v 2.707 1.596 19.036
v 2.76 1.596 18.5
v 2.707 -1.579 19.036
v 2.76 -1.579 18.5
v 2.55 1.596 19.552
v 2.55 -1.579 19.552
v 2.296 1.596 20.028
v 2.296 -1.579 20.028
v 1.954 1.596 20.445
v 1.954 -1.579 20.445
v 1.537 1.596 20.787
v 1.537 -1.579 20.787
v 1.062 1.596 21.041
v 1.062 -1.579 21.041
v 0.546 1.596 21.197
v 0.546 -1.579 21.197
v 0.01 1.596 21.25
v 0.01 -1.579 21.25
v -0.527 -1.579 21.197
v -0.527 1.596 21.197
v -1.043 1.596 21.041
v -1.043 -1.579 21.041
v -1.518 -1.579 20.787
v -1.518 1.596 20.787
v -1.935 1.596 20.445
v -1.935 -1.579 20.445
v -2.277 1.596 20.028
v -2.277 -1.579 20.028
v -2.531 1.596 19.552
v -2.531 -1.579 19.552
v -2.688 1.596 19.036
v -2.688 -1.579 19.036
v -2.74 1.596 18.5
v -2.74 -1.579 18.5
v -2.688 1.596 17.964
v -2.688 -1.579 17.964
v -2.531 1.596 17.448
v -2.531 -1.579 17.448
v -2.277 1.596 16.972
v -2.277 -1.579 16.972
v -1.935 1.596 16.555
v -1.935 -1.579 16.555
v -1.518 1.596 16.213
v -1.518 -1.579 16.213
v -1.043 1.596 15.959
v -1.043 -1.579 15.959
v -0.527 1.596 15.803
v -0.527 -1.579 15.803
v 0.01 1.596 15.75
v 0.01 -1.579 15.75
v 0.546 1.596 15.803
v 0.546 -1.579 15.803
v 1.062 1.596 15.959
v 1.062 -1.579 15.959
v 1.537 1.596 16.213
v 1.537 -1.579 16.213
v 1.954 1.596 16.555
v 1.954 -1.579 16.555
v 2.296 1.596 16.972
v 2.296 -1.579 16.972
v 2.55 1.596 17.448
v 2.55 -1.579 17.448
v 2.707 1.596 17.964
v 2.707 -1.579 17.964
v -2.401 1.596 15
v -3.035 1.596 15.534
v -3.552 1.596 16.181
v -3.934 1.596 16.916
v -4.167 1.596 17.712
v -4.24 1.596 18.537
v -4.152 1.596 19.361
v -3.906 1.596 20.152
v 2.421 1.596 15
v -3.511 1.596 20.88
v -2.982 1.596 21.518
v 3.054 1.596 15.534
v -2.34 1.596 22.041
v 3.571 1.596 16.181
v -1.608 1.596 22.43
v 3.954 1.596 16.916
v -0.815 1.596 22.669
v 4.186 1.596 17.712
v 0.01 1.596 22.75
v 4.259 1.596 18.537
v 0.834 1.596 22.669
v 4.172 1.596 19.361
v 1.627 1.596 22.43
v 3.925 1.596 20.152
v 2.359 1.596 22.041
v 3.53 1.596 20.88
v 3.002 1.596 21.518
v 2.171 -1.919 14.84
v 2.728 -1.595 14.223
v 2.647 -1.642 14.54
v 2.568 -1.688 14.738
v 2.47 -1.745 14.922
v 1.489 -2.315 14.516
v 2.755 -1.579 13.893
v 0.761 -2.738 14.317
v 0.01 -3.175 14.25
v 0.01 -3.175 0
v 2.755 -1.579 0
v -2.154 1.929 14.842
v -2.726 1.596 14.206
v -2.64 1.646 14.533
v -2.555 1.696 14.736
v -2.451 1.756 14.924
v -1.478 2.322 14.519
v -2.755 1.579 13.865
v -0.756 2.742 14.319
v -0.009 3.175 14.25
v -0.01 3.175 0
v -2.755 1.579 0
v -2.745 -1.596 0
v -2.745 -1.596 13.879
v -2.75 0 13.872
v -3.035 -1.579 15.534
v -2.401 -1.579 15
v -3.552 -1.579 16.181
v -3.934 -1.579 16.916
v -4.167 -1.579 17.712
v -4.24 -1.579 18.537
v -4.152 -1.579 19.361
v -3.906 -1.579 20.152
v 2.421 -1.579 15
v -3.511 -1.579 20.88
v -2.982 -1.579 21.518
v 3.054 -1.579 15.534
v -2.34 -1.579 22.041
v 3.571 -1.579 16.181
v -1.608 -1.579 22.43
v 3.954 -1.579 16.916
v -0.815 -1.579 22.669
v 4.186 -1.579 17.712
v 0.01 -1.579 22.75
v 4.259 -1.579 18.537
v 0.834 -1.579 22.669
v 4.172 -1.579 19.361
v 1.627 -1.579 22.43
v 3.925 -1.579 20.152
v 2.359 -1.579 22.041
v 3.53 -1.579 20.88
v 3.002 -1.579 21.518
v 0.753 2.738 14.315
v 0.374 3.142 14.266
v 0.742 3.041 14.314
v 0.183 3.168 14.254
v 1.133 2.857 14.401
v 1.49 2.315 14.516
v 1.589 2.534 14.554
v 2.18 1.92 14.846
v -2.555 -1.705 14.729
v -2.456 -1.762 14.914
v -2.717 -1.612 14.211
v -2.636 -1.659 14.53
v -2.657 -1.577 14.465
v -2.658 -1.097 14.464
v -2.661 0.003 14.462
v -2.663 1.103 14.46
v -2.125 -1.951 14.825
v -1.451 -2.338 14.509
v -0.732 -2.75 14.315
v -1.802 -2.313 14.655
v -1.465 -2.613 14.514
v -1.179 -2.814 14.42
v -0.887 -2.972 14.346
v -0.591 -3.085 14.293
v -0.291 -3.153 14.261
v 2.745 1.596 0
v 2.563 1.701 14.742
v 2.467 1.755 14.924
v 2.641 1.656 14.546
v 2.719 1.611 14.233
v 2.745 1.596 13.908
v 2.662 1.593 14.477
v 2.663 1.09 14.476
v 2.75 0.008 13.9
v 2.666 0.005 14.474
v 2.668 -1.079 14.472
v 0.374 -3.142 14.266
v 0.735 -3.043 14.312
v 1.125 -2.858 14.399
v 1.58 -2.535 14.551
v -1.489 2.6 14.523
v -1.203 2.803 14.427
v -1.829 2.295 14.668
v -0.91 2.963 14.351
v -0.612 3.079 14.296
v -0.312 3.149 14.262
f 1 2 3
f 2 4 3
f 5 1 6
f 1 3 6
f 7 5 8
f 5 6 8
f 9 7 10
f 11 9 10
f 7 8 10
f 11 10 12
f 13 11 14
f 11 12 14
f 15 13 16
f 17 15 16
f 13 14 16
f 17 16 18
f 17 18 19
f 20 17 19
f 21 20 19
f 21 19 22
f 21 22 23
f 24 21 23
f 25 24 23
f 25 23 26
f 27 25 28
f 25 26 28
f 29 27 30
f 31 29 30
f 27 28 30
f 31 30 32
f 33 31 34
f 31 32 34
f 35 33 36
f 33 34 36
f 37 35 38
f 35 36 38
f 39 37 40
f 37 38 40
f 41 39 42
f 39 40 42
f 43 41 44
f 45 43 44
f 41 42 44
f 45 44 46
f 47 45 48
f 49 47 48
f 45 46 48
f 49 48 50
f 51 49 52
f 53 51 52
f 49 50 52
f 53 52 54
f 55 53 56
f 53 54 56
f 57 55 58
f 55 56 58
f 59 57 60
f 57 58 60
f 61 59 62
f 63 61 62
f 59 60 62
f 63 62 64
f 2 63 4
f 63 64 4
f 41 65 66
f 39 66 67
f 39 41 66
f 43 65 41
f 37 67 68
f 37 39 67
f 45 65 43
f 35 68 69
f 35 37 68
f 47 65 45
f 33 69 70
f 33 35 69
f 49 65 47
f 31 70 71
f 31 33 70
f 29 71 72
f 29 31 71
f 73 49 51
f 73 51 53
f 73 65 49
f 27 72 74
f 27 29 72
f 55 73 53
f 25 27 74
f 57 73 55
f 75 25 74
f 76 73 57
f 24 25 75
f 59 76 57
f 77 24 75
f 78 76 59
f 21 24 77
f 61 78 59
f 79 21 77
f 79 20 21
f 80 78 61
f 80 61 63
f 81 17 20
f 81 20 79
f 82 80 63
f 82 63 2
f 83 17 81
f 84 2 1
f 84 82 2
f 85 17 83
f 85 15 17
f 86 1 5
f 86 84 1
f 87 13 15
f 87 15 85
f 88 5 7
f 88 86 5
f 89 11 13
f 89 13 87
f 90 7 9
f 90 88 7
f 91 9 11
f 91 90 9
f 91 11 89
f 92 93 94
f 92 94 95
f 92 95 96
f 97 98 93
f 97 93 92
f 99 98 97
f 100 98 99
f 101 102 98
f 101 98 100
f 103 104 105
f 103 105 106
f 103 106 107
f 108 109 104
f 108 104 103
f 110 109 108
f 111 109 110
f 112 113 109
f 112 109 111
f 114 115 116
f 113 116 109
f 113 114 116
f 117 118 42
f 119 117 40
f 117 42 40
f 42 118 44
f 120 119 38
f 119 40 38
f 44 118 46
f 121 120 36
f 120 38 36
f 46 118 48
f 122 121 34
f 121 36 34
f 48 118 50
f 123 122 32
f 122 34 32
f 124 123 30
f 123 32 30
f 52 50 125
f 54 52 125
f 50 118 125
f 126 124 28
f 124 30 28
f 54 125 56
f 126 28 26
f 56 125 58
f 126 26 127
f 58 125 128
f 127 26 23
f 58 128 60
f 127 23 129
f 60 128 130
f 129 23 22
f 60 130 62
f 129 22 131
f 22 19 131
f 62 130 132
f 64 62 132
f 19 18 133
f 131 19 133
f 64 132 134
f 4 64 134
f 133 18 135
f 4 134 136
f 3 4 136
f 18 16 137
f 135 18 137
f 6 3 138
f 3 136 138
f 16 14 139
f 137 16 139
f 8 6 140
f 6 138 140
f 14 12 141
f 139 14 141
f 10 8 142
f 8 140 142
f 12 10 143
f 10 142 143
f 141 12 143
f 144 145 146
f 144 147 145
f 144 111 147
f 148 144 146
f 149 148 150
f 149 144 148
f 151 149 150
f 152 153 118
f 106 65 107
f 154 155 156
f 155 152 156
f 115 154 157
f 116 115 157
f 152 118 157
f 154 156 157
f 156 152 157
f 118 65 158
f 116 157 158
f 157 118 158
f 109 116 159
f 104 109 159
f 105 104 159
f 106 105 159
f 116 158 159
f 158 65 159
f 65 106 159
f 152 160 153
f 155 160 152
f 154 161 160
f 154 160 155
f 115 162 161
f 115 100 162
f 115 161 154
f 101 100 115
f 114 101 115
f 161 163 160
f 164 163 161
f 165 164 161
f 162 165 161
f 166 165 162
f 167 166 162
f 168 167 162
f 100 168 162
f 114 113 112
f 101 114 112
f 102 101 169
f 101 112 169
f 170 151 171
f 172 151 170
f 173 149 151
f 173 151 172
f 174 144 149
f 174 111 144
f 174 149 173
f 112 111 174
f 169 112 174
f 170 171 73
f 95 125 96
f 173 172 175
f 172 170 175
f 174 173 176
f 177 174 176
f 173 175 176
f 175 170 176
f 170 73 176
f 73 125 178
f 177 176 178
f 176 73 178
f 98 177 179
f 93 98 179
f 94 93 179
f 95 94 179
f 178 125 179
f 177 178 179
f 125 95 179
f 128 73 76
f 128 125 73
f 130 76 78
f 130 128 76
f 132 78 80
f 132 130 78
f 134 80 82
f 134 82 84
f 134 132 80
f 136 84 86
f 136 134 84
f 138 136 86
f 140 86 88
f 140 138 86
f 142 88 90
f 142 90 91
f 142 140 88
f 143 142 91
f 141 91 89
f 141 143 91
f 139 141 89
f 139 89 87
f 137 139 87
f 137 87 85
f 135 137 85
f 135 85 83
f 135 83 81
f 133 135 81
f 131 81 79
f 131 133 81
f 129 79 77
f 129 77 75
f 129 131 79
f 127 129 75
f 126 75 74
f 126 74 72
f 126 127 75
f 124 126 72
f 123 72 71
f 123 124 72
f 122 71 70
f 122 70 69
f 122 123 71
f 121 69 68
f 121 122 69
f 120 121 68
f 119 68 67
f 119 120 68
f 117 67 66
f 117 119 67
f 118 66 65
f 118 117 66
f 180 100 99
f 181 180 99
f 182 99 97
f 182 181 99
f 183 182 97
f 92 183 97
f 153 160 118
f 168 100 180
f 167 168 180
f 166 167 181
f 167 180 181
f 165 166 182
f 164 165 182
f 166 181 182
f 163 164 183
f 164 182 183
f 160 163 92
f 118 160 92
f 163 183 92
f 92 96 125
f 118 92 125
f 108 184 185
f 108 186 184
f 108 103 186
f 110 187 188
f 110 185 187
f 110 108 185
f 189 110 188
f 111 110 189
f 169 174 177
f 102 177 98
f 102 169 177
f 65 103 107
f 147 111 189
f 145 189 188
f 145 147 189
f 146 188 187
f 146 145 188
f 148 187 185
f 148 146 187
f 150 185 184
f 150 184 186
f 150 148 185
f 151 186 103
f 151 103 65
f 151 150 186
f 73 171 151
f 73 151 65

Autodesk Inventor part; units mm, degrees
sketch "Boceto1" plane through (0, 0, 0) normal (0, 0, 1) x (1, 0, 0)
  line L0 (2.7452, 1.596) -> (2.7548, -1.5794)
  line L1 (2.7548, -1.5794) -> (0.0096, -3.1754)
  line L2 (0.0096, -3.1754) -> (-2.7452, -1.596)
  line L3 (-2.7452, -1.596) -> (-2.7548, 1.5794)
  line L4 (-2.7548, 1.5794) -> (-0.0096, 3.1754)
  line L5 (-0.0096, 3.1754) -> (2.7452, 1.596)
  point P0 (0, 0)
  point P1 (0, 0)
  dimension "d0" = 5.5
  dimension "d20" = 6.3508
extrude "Extrusión1" add sketch "Boceto1" along normal blind 15
ref_plane "Plano de trabajo4" through (-2.7452, -1.596, 0) normal (0, 0, -1) x (-1, 0, 0)
sketch "Boceto2" plane through (-2.7452, -1.596, 0) normal (0, 0, -1) x (-1, 0, 0)
  line L0 (-2.7548, -1.5794) -> (1.0358, -1.5794)
  line L1 (1.0358, -1.5794) -> (-2.7548, -1.5794)
  line L2 (-5.6299, -1.5794) -> (-2.7548, -1.5794)
  point P0 (-2.7452, 1.596)
  dimension "d5" = 3.1754
ref_plane "Plano de trabajo5" through (0, -3.175, 0) normal (0, 1, 0) x (-1, 0, 0)
sketch "Boceto3" plane through (0, -3.175, 0) normal (0, 1, 0) x (-1, 0, 0)
  line L0 (-0.0096, 15) -> (-2.7548, 15) projected
  line L1 (2.6199, 14) -> (-2.7548, 14) construction
  line L2 (-0.0096, 0) -> (-0.0096, 15) projected
  line L3 (-0.0096, 14) -> (-0.0096, 18.5)
  circle A0 centre (-0.0096, 18.5) radius 4.25
  circle A1 centre (-0.0096, 18.5) radius 2.75
  point P0 (0, 0)
  dimension "d7" = 1
  dimension "d8" = 4.5
  dimension "d9" = 8.5
  dimension "d14" = 5.5
sketch "Boceto4" plane through (-2.7452, -1.596, 0) normal (0, 0, -1) x (-1, 0, 0)
  point P0 (-2.7452, 1.596)
  point P1 (-2.7356, 4.7714)
  point P2 (-2.7548, -1.579)
  dimension "d10" = 6.3504
extrude "Extrusión2" add sketch "Boceto3" along normal blind 6.35 contours L2 A0 L0 | L0 A0 L2 | A1
ref_plane "Barreno" through (0, 0, 0) normal (0, -1, 0) x (1, 0, 0)
sketch "Boceto6" plane through (0, 0, 0) normal (0, -1, 0) x (1, 0, 0)
  arc A0 (0.0103, 14.25) -> (0.0089, 14.25) centre (0.0096, 18.5) ccw projected
  circle A1 centre (0.0096, 18.5) radius 2.75 projected
  point P0 (0, 0)
  dimension "d13" = 4.25
extrude "Extrusión3" cut sketch "Boceto6" along normal mid plane 10 contours A1
ref_plane "Plano de trabajo8" through (5, 0, 0) normal (1, 0, 0) x (0, 1, 0)
sketch "Boceto8" plane through (5, 0, 0) normal (1, 0, 0) x (0, 1, 0)
  line L0 (-3.175, 15.75) -> (-3.175, 21.25) projected
  line L1 (-3.1754, 14.25) -> (-1.5794, 15)
  line L2 (-1.5794, 15) -> (-1.5794, 22.75)
  line L3 (-1.5794, 22.75) -> (-3.175, 22.75)
  line L4 (3.175, 14.25) -> (1.596, 15)
  line L5 (1.596, 15) -> (1.596, 22.75)
  line L6 (1.596, 22.75) -> (3.175, 22.75)
  ellipse E0 centre (3.1866, 18.5) end of major axis (3.1866, 14.25) minor radius 2.4709 (1.7849, 15) -> (3.175, 14.25) ccw projected
  line L7 (-3.175, 22.75) -> (-6.1952, 22.75)
  line L8 (-6.1952, 22.75) -> (-6.1952, 14.0055)
  line L9 (-6.1952, 14.0055) -> (-3.1754, 14.25)
  line L10 (3.175, 14.25) -> (7.2865, 13.4418)
  line L11 (7.2865, 13.4418) -> (6.5328, 22.75)
  line L12 (6.5328, 22.75) -> (3.175, 22.75)
  point P0 (0, 0)
  point P1 (-1.5794, 15)
extrude "Extrusión4" cut sketch "Boceto8" against normal blind 10 contours L9 L8 L7 L3 L2 L1 | L4 L5 L6 L12 L11 L10
fillet "Empalme1" radius 2 1 edges at (-2.75, 0, 15)
fillet "Empalme2" radius 2 1 edges at (2.75, 0.0083, 15)
properties part number "Cabezal" material "Plástico ABS"
